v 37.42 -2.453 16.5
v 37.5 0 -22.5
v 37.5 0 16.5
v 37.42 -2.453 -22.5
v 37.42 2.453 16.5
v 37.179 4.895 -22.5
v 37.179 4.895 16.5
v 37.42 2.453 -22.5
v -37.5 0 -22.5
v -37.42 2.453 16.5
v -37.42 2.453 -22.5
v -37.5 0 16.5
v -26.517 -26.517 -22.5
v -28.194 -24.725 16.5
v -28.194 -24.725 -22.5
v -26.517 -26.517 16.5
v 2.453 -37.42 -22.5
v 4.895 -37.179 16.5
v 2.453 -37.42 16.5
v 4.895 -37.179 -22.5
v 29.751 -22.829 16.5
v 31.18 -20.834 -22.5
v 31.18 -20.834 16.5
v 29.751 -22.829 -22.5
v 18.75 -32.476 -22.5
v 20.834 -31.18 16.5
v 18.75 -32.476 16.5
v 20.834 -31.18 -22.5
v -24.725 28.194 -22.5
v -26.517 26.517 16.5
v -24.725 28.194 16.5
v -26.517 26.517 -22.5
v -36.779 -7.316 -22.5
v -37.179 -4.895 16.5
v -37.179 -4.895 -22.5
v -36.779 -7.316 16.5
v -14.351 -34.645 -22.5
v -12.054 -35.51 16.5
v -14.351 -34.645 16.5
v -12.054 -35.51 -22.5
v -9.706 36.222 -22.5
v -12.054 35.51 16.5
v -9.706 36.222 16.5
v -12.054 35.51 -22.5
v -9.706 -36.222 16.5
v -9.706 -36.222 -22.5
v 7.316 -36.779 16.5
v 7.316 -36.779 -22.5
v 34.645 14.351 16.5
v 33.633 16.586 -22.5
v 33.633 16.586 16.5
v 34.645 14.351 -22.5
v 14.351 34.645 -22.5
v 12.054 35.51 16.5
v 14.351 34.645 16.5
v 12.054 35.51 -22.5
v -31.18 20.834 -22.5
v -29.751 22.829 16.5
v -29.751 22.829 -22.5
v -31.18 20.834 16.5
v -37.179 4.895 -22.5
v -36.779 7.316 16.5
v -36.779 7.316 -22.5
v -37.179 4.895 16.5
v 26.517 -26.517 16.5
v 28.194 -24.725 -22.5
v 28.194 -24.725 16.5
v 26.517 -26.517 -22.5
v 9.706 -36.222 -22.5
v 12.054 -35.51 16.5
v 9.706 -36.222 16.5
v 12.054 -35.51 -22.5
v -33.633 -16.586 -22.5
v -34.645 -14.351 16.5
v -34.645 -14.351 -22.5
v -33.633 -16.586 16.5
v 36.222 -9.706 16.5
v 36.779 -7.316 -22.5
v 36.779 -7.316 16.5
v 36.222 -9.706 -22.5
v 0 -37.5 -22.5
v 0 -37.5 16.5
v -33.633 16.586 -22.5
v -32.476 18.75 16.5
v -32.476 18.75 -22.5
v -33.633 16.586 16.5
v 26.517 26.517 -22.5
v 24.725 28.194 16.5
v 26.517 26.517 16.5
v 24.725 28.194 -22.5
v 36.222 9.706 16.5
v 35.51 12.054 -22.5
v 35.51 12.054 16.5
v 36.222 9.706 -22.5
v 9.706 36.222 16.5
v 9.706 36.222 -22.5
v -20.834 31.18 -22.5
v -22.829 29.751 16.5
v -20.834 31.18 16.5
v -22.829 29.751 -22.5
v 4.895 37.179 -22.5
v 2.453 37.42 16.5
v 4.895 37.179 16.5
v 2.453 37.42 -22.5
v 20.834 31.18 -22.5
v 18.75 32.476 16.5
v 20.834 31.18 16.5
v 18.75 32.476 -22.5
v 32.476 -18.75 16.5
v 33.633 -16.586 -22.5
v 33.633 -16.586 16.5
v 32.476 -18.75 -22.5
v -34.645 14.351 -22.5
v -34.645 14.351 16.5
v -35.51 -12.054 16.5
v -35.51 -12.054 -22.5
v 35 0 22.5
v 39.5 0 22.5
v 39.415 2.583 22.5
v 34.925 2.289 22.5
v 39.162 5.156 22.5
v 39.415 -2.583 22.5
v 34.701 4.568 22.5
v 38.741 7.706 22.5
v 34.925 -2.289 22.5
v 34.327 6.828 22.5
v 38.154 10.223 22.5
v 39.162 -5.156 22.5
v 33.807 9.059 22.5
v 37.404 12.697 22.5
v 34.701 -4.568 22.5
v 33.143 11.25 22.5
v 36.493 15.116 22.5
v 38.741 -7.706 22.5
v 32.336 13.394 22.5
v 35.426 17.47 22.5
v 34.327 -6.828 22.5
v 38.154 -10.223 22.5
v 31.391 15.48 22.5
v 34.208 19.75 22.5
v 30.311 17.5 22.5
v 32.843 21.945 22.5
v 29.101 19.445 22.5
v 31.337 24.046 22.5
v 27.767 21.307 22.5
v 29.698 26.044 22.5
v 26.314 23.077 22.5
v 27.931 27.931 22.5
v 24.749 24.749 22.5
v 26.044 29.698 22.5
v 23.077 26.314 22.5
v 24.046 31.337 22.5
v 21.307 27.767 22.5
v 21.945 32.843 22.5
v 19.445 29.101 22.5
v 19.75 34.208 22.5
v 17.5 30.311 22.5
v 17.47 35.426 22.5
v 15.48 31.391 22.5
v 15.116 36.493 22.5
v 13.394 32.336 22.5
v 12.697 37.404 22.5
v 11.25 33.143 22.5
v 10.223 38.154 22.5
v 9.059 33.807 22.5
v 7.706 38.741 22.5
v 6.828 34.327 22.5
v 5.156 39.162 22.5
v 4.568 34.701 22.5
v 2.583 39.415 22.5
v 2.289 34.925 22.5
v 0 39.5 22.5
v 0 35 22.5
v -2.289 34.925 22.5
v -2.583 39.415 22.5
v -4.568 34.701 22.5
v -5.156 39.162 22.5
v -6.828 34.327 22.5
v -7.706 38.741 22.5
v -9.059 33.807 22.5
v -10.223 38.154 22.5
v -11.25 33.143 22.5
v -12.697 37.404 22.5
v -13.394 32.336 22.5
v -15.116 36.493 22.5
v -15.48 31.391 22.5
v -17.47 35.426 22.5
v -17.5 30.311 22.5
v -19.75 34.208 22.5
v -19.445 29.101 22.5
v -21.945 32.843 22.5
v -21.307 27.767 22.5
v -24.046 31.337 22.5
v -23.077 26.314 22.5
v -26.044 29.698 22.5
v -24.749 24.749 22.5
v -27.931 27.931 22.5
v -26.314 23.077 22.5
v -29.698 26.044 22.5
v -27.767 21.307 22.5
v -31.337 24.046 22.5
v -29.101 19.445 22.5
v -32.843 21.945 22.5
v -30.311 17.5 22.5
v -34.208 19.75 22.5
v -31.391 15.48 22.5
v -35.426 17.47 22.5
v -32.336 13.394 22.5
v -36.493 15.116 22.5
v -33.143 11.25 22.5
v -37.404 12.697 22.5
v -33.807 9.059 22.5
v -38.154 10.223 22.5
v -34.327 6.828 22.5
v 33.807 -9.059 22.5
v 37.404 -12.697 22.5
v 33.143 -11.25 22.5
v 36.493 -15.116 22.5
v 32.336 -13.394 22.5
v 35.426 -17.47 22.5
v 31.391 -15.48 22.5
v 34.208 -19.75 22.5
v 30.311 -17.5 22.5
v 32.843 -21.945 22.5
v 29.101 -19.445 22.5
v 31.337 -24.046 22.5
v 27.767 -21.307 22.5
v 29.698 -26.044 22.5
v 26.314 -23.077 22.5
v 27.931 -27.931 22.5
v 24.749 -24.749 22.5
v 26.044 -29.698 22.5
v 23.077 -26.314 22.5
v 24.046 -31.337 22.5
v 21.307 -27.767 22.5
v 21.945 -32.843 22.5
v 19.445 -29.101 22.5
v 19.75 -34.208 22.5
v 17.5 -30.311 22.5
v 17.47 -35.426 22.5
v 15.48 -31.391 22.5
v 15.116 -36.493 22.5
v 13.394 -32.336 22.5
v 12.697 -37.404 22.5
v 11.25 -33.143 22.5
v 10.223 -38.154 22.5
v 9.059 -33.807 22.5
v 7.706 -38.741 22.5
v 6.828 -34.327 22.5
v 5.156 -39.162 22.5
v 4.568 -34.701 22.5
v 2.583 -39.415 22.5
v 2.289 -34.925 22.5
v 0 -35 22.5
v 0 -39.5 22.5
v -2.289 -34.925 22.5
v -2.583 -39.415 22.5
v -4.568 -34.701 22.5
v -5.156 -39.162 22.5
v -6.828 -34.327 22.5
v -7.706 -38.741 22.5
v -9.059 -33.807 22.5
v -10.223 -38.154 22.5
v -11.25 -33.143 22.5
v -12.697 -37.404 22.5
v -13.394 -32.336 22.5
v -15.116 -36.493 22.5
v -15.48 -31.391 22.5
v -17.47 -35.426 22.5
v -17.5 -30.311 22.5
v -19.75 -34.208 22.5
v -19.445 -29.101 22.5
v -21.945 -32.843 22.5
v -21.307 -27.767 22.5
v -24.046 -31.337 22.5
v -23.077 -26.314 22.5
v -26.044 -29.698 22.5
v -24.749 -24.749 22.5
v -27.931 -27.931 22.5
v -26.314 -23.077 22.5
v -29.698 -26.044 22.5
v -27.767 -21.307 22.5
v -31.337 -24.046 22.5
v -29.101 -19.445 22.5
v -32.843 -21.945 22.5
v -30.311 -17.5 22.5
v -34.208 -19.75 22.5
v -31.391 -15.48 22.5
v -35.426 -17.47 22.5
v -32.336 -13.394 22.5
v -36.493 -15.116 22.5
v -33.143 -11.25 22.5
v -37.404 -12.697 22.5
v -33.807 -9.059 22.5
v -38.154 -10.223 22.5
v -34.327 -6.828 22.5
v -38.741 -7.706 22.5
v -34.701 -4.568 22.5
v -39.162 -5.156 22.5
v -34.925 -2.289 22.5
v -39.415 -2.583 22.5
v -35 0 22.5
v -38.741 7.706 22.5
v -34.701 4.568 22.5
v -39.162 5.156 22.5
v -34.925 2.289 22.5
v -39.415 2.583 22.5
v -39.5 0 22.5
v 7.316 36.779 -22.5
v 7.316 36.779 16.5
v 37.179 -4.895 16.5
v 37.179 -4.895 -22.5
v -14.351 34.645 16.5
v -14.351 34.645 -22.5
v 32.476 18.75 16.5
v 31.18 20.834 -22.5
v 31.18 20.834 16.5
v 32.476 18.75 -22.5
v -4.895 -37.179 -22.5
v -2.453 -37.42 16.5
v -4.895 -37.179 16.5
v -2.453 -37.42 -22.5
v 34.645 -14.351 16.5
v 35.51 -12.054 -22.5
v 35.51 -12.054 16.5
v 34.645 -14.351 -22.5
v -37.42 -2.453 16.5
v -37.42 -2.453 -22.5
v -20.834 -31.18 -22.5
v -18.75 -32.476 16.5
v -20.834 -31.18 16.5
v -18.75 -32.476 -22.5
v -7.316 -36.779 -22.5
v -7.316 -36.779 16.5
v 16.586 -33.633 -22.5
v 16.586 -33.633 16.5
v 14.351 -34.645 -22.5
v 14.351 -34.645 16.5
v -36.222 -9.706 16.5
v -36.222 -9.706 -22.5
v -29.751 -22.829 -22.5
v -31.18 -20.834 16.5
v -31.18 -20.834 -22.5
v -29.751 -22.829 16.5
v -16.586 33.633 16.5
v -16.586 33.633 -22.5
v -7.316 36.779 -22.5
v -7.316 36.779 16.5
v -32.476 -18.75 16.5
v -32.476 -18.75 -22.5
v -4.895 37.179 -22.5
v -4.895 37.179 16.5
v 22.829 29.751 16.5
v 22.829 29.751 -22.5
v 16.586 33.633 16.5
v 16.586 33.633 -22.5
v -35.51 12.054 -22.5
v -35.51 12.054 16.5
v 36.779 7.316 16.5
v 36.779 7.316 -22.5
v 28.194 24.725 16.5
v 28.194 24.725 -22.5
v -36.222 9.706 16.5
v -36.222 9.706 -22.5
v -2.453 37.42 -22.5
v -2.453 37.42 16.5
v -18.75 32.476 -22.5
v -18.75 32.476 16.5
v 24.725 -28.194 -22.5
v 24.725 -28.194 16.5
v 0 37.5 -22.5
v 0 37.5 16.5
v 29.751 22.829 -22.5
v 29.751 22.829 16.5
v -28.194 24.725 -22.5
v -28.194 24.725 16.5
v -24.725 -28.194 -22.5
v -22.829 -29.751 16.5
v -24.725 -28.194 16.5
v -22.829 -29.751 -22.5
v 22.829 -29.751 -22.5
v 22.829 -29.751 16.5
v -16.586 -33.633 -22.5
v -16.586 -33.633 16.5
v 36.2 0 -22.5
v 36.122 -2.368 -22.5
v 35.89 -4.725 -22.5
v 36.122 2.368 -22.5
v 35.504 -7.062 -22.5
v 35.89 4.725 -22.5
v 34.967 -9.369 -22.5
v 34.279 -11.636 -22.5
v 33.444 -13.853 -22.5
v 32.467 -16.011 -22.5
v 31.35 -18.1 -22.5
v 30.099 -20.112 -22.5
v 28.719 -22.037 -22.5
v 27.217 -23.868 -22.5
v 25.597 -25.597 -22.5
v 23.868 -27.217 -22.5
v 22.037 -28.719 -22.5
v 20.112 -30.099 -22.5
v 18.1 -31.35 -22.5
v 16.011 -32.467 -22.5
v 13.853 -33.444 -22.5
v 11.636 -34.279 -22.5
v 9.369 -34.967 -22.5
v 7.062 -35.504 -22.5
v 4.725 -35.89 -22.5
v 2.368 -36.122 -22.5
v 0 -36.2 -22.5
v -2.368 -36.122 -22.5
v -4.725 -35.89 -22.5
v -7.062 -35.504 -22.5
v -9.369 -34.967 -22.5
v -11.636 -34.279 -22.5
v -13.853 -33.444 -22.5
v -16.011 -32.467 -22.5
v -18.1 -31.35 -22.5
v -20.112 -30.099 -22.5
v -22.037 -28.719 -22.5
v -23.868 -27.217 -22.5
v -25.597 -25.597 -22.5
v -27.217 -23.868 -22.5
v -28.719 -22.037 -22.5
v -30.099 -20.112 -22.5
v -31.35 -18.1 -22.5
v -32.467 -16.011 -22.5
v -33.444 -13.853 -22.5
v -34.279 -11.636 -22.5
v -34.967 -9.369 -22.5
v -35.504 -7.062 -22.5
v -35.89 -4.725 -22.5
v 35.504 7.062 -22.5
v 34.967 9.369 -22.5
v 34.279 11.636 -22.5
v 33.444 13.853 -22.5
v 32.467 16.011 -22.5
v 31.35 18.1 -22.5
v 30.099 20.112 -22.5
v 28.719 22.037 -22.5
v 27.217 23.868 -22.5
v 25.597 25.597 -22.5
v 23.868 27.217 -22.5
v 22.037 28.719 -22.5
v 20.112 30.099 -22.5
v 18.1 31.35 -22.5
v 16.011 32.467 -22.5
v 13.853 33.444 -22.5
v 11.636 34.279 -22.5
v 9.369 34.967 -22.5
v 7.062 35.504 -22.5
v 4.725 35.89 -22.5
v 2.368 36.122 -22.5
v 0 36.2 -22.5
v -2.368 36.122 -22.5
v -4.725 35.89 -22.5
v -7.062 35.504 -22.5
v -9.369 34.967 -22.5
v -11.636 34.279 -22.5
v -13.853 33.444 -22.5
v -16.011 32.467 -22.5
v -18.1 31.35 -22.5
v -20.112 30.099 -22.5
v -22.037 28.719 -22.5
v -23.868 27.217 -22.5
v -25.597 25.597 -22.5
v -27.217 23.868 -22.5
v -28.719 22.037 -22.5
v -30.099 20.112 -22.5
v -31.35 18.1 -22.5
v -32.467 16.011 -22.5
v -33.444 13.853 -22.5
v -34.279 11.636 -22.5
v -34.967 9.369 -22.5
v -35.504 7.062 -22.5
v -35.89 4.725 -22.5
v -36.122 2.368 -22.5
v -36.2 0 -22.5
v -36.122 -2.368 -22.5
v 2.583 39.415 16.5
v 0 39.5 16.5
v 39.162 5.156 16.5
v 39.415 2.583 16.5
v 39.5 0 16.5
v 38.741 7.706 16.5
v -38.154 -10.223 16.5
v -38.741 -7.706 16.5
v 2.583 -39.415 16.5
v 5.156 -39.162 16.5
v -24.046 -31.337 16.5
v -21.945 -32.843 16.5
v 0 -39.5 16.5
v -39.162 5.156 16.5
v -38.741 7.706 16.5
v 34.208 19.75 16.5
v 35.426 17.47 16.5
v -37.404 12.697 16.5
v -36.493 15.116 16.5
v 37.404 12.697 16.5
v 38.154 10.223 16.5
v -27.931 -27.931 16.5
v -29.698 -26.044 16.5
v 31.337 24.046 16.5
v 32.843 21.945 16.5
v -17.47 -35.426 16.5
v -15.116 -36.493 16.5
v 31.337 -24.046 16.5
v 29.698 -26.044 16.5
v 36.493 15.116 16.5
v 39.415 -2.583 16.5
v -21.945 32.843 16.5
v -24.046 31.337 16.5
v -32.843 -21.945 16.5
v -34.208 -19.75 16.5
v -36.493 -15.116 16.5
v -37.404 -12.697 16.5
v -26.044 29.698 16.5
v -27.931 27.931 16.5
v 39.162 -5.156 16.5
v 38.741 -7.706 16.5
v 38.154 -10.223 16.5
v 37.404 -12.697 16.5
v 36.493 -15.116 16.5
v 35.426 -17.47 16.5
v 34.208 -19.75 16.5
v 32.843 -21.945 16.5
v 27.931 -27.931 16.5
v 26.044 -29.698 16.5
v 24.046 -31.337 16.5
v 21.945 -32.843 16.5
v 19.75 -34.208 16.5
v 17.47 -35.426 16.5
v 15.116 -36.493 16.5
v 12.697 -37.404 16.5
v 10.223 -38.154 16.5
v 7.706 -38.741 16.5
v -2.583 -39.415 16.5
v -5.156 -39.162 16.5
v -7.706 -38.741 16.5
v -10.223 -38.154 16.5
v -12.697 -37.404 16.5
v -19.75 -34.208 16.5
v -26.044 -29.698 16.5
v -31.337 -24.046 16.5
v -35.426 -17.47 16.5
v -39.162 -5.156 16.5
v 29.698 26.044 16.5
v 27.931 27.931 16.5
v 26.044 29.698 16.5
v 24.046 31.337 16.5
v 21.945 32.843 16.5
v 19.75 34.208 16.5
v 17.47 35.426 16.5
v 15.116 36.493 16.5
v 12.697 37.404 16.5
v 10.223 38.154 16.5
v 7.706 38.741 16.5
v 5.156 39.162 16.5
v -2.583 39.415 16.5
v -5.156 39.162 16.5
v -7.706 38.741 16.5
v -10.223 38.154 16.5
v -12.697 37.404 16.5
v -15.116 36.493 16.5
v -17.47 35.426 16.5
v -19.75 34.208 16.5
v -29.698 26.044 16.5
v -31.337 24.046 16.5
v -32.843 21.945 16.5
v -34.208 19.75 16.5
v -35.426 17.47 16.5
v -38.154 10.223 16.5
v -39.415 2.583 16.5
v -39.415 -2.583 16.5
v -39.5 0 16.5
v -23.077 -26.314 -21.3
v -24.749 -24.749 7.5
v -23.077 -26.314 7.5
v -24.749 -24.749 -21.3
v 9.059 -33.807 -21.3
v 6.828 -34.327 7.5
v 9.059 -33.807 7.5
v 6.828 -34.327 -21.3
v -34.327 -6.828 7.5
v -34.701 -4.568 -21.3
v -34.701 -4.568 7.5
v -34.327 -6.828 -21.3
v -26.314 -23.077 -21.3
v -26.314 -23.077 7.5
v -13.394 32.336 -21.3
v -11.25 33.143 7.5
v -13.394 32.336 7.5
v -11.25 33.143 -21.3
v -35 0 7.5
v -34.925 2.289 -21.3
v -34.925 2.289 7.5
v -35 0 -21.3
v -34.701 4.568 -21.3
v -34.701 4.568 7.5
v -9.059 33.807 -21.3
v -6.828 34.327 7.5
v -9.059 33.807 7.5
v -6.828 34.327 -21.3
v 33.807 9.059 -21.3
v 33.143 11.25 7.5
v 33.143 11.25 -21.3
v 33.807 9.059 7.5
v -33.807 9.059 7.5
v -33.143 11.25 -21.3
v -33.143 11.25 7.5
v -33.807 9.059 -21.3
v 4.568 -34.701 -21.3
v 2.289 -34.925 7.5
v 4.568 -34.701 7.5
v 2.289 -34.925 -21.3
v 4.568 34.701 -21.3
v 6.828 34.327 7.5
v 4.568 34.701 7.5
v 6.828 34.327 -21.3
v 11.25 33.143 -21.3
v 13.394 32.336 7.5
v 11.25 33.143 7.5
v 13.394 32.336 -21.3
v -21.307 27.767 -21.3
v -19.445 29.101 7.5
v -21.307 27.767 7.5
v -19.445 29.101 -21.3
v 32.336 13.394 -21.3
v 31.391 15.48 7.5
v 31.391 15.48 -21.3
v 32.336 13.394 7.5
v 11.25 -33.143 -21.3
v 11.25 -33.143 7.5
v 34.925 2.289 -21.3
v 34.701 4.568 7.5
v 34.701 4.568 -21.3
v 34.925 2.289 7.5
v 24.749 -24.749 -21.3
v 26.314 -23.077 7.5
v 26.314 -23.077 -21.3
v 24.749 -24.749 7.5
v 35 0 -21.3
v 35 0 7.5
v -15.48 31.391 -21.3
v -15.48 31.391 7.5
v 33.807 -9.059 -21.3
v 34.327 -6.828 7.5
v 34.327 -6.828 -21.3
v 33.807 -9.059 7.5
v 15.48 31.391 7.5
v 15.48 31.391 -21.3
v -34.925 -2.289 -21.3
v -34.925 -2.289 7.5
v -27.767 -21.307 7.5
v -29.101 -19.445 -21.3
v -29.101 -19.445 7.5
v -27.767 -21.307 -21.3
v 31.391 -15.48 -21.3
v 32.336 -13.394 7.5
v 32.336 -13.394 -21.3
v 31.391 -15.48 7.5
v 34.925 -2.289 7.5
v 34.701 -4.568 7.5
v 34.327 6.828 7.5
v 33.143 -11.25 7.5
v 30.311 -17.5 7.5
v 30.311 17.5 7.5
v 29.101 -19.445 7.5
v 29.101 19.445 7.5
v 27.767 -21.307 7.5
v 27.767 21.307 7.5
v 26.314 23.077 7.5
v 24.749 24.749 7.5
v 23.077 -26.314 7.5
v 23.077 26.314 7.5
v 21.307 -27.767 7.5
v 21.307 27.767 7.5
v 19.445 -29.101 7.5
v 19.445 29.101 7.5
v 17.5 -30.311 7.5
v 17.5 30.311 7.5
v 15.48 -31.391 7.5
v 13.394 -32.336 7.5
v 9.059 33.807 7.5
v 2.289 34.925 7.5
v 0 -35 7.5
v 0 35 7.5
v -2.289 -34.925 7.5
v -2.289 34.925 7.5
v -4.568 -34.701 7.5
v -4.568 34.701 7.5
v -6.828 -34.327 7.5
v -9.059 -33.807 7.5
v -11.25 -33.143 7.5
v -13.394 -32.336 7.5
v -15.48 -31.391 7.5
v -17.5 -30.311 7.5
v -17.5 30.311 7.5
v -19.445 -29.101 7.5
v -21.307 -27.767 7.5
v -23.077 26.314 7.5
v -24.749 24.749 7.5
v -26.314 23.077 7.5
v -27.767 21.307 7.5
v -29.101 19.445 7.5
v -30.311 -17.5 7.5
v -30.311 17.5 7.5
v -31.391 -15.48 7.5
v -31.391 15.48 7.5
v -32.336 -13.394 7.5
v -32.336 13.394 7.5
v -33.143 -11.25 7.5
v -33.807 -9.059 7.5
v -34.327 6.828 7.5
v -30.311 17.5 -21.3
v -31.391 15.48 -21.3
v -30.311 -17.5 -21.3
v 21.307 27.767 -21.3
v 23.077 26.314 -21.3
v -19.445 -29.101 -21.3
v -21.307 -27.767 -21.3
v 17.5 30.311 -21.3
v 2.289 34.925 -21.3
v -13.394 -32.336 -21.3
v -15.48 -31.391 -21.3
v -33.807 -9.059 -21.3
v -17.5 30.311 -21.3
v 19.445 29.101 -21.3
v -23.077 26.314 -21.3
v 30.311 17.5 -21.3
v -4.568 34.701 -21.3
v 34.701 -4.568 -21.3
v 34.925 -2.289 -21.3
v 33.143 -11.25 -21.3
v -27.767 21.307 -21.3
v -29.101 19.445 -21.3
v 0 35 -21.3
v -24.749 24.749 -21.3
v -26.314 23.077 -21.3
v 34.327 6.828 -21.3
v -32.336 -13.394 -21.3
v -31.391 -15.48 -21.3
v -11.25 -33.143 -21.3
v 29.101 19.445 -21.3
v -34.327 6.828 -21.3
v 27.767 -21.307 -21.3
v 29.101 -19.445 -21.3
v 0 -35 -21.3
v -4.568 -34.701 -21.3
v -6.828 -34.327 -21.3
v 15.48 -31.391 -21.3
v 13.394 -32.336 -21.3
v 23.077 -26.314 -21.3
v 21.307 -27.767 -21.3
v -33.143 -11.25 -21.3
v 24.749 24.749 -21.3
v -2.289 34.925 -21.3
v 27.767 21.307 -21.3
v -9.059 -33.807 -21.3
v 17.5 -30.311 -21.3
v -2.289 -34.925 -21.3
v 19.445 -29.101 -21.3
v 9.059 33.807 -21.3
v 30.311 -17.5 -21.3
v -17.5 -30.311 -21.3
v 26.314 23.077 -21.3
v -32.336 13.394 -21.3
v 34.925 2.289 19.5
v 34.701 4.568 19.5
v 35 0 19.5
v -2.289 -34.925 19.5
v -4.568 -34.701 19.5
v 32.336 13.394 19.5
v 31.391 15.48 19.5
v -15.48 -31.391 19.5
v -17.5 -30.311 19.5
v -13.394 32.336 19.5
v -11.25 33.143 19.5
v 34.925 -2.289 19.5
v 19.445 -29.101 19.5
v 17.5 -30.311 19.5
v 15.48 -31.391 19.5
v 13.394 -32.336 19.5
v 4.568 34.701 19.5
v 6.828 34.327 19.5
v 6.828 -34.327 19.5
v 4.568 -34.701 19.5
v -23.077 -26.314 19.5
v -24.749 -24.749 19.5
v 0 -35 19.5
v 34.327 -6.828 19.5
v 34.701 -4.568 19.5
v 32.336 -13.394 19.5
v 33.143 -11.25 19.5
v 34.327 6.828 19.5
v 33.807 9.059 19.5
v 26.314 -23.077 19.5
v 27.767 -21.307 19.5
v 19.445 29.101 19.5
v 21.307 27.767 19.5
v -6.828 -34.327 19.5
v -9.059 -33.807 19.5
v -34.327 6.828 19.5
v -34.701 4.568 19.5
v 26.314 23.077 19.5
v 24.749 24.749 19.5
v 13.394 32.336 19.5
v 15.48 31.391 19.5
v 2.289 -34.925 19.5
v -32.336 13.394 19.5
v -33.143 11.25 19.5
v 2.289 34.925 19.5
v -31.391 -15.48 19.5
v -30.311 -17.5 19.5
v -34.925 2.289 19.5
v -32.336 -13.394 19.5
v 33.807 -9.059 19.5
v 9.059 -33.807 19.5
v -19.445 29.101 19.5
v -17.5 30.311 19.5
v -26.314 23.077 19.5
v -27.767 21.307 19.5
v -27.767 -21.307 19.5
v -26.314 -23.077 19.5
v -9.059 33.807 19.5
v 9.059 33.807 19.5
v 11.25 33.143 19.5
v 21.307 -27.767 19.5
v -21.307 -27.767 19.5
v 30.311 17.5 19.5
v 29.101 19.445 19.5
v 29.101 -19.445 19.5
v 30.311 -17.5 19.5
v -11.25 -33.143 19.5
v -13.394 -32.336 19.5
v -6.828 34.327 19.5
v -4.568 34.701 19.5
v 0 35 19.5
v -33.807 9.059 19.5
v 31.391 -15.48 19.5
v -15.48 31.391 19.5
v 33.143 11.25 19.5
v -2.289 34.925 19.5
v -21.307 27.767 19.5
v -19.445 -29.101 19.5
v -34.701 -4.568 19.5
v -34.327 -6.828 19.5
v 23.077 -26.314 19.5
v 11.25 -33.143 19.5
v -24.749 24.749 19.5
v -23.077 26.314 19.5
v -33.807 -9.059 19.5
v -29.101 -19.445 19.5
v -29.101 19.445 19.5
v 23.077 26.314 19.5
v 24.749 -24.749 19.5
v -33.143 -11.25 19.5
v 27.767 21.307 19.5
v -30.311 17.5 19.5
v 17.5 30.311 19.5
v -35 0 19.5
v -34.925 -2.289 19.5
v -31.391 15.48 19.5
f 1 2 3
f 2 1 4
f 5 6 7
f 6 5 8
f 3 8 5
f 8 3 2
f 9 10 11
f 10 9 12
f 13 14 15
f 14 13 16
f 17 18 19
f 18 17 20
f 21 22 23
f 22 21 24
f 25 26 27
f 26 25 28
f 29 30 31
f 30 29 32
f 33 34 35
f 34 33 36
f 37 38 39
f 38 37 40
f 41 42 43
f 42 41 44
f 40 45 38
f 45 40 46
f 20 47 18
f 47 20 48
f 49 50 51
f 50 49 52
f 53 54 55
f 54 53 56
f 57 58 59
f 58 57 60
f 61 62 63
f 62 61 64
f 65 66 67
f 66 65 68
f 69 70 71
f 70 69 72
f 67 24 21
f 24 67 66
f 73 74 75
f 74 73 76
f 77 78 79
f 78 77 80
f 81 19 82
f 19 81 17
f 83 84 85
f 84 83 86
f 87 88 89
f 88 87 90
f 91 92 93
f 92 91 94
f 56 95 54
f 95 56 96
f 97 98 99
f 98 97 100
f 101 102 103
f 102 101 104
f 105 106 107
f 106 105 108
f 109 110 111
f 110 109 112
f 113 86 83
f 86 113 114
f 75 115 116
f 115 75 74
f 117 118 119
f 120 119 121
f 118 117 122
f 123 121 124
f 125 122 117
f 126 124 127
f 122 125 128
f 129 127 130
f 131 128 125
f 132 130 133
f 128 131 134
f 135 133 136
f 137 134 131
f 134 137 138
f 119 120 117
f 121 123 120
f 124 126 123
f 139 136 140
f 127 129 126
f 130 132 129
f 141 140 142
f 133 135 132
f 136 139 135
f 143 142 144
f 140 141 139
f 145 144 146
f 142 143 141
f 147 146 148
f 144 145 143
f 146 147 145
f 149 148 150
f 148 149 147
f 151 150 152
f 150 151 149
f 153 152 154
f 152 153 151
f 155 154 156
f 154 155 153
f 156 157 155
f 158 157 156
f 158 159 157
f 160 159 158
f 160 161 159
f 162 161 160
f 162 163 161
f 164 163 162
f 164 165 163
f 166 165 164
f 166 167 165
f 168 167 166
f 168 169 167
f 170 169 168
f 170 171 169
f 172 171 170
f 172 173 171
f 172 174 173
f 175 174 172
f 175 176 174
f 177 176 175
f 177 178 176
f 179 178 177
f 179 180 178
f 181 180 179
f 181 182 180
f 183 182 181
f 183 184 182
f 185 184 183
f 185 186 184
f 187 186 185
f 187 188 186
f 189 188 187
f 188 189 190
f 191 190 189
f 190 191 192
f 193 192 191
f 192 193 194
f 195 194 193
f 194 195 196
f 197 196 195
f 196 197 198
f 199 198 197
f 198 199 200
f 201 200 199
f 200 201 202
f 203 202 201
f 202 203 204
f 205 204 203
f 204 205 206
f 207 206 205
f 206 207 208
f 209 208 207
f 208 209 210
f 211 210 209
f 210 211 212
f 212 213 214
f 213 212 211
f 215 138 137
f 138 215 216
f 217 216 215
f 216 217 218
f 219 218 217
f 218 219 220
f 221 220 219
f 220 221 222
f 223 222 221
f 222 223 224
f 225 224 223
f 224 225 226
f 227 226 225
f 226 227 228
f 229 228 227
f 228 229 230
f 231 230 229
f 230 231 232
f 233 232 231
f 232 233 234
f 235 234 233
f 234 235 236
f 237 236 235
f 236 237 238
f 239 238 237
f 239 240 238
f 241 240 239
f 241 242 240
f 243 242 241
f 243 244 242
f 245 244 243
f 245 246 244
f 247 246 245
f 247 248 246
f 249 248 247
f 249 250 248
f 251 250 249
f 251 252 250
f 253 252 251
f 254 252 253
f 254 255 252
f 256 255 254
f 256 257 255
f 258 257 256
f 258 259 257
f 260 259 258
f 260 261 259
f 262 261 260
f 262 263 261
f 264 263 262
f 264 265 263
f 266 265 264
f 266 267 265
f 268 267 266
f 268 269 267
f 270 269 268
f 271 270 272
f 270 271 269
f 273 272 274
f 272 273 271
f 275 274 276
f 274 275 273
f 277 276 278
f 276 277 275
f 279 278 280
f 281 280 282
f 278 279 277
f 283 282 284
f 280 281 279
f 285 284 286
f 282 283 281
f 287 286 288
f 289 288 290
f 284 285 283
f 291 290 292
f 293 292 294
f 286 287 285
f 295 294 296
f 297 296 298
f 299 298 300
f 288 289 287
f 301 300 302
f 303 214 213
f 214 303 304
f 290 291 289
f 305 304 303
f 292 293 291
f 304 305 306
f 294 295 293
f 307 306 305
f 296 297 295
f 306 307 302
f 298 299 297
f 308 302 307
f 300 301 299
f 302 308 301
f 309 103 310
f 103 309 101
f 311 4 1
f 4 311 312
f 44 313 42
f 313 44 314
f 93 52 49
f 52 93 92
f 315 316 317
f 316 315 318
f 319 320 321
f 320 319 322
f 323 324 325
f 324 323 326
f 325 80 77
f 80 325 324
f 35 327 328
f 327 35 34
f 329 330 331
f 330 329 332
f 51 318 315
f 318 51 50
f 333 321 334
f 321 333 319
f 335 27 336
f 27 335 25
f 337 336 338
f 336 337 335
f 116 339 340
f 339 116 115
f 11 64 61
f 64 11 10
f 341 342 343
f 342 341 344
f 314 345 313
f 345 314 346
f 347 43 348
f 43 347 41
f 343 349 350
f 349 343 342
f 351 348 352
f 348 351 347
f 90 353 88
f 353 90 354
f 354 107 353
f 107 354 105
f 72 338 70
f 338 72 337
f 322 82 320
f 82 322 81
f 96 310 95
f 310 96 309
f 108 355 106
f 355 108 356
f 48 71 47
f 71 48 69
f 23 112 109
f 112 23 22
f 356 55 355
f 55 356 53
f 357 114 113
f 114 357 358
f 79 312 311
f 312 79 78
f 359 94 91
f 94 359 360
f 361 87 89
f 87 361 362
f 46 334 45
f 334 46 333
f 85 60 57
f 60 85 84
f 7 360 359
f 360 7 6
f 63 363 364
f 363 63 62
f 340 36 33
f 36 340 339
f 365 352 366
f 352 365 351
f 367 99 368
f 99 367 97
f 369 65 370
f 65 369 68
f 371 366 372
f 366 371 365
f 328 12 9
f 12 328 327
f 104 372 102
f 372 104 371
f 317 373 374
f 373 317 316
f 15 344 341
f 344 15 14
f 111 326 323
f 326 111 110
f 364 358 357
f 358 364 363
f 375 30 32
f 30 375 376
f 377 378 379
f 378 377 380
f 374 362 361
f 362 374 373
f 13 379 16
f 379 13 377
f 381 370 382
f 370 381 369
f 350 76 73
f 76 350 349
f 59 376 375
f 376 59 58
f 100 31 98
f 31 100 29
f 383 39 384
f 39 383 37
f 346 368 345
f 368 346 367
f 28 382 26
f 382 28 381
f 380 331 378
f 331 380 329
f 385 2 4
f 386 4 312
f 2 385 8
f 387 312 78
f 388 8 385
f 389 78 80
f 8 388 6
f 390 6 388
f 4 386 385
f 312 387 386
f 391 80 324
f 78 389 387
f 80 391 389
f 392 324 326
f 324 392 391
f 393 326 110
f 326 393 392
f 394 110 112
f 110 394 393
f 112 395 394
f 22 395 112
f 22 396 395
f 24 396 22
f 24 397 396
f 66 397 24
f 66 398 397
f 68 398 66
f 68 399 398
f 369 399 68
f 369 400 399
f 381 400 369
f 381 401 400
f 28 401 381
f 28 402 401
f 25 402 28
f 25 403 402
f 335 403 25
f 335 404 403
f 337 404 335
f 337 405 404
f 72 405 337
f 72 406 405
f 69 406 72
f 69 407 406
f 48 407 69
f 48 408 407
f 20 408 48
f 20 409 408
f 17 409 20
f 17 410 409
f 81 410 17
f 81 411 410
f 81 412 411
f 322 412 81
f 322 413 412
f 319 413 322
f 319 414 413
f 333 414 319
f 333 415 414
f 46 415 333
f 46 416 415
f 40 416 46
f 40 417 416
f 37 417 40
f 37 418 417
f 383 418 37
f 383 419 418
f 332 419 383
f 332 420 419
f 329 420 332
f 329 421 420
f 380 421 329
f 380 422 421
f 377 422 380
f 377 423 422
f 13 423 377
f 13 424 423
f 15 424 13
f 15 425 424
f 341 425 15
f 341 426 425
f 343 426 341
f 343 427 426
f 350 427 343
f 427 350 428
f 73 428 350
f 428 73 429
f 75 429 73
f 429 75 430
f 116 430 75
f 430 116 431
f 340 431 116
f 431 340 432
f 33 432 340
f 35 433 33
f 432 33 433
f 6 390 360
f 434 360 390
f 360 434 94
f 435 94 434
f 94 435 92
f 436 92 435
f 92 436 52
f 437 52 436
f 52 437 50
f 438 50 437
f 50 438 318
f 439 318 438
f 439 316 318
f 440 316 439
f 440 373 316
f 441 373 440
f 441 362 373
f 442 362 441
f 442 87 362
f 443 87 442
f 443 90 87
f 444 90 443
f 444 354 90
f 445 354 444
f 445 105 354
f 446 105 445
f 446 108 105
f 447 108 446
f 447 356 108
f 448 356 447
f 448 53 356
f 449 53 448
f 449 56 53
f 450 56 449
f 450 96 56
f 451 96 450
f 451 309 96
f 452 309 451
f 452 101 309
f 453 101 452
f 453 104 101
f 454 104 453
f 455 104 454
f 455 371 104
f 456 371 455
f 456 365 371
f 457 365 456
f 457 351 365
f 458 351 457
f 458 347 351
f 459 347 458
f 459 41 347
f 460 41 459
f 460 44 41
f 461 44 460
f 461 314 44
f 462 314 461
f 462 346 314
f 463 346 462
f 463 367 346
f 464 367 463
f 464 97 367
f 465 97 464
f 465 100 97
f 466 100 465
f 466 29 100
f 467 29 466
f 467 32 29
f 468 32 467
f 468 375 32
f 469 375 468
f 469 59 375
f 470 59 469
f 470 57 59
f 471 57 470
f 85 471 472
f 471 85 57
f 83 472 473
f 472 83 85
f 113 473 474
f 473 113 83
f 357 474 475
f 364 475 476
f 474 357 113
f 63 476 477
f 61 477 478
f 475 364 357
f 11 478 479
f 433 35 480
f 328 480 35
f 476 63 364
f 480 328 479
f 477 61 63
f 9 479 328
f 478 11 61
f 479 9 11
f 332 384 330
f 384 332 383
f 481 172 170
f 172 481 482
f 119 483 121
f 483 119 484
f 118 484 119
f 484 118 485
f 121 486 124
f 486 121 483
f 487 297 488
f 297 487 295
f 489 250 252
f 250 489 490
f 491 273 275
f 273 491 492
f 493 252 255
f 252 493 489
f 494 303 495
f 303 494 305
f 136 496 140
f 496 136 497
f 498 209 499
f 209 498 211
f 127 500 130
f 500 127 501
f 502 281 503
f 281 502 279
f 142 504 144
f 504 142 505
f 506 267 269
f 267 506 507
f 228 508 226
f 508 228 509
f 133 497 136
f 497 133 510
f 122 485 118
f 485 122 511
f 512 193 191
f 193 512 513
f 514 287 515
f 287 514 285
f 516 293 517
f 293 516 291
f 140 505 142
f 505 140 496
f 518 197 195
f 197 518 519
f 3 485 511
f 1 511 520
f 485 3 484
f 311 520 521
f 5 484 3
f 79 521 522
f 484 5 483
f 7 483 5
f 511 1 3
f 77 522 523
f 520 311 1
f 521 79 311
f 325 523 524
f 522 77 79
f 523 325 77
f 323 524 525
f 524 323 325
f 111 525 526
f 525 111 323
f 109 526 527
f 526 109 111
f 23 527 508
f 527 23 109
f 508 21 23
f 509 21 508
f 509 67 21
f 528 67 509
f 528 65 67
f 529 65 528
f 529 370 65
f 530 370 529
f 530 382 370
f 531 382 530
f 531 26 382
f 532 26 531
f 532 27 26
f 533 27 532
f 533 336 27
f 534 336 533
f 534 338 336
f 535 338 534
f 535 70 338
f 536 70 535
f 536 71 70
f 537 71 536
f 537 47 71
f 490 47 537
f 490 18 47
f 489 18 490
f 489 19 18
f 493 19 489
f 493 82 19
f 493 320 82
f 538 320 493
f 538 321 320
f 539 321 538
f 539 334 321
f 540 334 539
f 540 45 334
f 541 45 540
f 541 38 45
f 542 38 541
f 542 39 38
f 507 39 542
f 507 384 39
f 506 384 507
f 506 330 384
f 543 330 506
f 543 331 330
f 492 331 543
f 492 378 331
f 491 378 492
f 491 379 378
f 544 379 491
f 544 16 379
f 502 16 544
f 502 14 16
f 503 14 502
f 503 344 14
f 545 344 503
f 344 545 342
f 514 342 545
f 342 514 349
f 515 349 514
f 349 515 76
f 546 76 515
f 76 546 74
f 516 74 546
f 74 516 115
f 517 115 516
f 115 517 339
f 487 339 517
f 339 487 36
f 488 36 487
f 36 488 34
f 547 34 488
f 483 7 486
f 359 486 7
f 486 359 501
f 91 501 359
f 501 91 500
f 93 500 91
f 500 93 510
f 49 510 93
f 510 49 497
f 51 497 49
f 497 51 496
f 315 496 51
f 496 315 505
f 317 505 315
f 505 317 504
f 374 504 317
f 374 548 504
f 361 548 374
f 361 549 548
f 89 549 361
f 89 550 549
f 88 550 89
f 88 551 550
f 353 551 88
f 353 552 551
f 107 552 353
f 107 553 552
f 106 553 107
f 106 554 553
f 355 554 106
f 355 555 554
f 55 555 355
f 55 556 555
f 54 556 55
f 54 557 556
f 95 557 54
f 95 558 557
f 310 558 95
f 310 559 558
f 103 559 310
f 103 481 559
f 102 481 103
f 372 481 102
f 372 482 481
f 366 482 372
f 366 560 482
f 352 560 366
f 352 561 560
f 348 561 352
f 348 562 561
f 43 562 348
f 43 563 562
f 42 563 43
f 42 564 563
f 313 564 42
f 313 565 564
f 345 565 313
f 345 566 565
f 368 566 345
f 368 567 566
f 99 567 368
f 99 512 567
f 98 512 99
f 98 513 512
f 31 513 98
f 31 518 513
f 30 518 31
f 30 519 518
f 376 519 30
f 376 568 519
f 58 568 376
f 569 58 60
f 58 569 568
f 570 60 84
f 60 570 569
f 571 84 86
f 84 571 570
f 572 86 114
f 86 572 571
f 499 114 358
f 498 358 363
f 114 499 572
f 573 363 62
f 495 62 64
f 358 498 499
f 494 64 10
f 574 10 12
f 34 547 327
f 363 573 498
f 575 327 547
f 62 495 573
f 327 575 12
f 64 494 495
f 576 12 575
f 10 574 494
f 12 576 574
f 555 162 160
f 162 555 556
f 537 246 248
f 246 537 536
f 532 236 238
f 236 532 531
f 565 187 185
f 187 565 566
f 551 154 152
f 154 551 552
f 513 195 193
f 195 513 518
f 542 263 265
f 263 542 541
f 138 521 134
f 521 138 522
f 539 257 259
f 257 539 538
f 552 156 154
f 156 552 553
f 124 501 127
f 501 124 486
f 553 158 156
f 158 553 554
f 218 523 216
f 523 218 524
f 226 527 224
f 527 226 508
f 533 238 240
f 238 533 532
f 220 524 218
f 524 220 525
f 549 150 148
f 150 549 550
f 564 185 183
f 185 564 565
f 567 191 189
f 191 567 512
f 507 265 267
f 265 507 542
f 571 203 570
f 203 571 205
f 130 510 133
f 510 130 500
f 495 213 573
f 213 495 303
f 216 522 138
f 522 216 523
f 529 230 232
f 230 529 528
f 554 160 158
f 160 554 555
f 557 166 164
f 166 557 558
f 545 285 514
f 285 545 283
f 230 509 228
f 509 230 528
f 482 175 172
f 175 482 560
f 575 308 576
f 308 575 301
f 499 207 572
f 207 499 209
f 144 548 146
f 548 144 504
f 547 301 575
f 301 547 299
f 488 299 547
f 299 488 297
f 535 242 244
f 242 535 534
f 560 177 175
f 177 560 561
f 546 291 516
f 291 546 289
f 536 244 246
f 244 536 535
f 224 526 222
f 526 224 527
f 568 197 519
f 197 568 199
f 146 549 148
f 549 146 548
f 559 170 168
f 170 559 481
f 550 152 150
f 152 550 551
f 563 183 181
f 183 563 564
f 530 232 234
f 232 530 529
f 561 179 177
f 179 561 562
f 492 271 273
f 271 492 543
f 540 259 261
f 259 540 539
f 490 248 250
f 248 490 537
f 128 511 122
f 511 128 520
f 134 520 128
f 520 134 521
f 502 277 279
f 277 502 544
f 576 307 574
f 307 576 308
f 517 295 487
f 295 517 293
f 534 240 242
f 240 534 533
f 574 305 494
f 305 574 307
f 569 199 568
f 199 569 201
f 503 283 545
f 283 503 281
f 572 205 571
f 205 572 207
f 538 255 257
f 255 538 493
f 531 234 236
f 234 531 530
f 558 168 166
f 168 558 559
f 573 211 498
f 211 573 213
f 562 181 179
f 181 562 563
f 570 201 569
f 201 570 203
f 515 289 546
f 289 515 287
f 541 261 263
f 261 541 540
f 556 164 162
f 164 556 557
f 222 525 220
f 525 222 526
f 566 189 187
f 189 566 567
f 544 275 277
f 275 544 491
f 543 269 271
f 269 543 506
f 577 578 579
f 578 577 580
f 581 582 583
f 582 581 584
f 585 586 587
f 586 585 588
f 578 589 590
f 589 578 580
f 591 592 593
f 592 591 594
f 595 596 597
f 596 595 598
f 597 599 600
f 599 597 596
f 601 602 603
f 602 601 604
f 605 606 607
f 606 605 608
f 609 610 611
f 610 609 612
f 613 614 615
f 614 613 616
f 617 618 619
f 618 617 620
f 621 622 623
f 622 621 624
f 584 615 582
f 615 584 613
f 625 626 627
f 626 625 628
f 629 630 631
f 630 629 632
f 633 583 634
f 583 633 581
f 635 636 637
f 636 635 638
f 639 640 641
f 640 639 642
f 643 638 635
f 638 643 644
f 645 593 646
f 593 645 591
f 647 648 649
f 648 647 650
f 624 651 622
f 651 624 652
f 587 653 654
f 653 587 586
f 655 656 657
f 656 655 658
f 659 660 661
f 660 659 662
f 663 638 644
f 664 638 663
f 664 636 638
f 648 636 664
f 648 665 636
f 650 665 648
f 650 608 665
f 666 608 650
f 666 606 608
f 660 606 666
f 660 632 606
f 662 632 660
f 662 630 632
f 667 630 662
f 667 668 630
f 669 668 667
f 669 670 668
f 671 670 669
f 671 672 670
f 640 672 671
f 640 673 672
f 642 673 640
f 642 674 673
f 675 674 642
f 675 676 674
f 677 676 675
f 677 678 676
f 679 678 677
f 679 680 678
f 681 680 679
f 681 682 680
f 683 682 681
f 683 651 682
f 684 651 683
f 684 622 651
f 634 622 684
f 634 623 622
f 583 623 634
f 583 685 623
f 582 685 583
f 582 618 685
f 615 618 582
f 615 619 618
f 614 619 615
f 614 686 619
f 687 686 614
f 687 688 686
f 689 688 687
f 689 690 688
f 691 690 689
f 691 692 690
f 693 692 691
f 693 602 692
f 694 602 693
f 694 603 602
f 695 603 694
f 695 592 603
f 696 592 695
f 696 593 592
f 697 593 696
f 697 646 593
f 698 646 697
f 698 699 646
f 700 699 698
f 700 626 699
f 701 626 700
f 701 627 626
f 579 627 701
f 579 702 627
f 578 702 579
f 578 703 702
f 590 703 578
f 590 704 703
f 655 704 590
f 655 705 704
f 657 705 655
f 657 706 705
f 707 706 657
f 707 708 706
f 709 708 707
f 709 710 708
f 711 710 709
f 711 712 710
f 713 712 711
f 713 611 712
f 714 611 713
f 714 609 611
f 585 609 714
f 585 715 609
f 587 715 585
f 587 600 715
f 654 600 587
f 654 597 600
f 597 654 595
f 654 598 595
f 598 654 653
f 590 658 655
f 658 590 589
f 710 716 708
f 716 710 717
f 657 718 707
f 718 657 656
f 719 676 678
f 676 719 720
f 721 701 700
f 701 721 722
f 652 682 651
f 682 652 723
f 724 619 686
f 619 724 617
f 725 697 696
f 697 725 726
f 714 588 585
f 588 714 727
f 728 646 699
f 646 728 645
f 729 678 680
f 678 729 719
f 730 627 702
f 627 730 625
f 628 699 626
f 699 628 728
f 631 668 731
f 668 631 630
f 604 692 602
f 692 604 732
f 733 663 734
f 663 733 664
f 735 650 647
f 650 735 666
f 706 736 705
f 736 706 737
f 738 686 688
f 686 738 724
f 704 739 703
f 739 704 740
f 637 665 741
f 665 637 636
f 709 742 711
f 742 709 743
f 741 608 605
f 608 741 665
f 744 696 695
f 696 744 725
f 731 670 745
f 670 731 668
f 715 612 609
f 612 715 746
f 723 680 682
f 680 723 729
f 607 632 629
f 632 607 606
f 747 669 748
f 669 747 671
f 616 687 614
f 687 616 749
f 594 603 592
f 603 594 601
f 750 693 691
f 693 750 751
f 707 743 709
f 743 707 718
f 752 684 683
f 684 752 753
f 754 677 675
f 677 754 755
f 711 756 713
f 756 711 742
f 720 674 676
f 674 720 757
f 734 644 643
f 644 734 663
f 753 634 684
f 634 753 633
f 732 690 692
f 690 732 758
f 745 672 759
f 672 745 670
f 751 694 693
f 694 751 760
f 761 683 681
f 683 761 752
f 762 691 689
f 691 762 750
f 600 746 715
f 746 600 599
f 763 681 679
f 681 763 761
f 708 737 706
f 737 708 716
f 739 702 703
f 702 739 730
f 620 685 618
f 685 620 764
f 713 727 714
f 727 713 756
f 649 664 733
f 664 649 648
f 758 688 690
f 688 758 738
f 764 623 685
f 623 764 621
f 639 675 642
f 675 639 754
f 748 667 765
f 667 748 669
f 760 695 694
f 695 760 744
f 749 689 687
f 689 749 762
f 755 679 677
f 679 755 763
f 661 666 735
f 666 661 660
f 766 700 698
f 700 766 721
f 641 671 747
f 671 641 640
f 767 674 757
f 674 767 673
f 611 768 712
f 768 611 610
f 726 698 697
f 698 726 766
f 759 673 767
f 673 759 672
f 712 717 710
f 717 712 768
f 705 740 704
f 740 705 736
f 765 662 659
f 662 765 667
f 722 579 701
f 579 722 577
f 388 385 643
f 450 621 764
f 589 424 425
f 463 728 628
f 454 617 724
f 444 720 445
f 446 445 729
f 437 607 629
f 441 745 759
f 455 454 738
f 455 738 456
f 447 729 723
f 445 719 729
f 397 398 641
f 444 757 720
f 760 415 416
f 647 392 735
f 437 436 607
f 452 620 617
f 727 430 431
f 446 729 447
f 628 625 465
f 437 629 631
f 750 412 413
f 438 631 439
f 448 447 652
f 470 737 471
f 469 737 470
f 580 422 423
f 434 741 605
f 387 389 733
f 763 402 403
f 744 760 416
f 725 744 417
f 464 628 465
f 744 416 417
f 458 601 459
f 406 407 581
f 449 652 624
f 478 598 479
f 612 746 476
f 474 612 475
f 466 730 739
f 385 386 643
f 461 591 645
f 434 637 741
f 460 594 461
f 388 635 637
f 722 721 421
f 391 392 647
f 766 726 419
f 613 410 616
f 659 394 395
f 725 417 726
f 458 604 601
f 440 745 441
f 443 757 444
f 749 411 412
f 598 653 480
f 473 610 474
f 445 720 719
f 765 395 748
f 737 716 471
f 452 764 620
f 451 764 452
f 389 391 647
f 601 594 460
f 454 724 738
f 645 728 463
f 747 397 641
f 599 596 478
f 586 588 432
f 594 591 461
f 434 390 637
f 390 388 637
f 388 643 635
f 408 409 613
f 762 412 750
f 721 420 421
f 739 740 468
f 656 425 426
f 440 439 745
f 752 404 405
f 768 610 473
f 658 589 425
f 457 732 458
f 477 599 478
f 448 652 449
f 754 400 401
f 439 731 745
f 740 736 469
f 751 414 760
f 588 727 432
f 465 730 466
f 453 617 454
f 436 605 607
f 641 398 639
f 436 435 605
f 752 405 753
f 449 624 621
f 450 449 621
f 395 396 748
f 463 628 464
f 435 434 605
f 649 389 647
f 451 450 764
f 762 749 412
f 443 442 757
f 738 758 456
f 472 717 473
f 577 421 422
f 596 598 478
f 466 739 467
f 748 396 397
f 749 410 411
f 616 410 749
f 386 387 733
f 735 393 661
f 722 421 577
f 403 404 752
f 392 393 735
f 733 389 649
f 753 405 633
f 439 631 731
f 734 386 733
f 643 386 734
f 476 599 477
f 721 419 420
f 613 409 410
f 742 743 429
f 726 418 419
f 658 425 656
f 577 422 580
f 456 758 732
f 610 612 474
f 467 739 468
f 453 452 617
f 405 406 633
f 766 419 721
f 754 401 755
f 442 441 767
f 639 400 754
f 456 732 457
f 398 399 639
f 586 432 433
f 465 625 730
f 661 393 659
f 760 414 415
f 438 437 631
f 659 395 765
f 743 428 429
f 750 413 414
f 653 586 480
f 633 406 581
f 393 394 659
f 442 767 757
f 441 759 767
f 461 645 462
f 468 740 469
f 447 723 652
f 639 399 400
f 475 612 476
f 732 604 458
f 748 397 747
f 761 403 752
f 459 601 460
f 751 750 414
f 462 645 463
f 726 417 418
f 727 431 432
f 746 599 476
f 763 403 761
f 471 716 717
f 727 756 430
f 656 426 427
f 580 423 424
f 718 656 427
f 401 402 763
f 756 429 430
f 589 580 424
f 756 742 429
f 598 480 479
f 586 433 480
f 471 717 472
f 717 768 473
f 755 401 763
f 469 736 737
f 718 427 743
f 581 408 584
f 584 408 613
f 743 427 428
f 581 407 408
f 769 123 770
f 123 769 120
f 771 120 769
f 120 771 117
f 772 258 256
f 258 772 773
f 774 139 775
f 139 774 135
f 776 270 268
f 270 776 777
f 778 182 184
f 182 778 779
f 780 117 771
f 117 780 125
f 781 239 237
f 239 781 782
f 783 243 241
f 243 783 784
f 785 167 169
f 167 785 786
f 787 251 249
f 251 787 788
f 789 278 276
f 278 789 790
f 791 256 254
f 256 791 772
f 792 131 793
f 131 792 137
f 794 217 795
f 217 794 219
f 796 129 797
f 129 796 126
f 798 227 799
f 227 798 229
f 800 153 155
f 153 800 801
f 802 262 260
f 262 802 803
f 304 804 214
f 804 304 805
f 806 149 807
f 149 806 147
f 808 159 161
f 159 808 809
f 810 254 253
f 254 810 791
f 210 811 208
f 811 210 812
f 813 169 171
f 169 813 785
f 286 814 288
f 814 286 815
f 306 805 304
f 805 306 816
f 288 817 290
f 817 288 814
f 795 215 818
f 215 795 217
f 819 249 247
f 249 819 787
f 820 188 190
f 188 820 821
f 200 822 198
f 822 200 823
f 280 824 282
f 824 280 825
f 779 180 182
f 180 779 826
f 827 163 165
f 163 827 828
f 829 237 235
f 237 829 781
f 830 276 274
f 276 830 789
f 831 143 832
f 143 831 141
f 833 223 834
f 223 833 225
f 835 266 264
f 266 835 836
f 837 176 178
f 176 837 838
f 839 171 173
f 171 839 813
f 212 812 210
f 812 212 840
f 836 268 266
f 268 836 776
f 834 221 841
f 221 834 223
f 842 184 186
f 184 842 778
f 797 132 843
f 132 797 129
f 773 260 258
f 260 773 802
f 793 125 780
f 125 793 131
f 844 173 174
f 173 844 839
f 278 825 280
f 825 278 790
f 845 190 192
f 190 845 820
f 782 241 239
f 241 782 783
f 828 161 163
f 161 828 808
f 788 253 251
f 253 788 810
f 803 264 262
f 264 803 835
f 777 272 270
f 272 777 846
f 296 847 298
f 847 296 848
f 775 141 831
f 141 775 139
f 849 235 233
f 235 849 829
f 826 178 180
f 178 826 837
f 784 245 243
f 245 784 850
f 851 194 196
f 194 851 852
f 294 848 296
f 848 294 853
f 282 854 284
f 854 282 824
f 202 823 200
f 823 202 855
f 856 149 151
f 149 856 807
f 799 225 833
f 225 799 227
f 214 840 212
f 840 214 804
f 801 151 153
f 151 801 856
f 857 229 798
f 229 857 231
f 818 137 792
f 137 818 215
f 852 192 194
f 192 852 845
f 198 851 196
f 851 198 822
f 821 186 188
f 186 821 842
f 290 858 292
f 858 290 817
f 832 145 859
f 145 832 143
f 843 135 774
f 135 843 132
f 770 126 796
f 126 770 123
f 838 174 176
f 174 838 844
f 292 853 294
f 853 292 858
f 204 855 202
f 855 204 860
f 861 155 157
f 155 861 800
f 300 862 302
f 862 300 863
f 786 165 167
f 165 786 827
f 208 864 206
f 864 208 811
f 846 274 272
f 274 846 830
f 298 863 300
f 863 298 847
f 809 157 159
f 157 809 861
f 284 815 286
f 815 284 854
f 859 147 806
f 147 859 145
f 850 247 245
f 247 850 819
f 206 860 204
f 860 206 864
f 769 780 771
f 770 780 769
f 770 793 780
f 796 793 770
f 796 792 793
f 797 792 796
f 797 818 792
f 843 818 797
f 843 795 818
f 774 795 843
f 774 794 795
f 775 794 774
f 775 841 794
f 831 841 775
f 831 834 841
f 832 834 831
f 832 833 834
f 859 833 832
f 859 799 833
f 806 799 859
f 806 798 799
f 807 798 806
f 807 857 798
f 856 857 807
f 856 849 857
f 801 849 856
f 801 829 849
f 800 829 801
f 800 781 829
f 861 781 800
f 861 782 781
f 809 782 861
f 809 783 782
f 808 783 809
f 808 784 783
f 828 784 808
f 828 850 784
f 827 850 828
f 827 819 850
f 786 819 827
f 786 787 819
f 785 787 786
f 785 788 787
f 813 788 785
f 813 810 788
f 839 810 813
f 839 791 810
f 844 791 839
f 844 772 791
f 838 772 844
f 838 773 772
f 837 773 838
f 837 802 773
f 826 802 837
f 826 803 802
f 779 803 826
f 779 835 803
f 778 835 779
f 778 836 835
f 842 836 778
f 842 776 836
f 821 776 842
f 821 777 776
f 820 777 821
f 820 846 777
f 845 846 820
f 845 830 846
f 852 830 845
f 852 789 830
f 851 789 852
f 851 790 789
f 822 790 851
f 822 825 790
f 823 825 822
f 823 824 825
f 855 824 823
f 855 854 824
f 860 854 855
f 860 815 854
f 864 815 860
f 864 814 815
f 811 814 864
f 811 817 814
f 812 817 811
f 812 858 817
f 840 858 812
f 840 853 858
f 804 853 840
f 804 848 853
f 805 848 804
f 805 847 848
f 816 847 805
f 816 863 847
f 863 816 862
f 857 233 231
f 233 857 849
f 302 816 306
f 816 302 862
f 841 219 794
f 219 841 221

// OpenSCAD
$fn=96;

module ht75_cap(
    od=75,
    wall=2.5,
    height=45,
    top_thickness=3,
    socket_depth=30,
    lip_height=6,
    lip_extra=2.0,
    chamfer=1.2
){
    id = od - 2*wall;
    outer_r = od/2;
    inner_r = id/2;

    module outer_shell(){
        union(){
            cylinder(h=height, r=outer_r);
            translate([0,0,height-lip_height])
                cylinder(h=lip_height, r=outer_r + lip_extra);
        }
    }

    module inner_void(){
        union(){
            translate([0,0,0])
                cylinder(h=socket_depth, r=inner_r);
            translate([0,0,0])
                cylinder(h=chamfer, r1=inner_r+chamfer, r2=inner_r);
        }
    }

    module top_relief(){
        translate([0,0,height-top_thickness])
            cylinder(h=top_thickness+0.2, r=inner_r);
    }

    translate([0,0,-height/2])
    difference(){
        outer_shell();
        inner_void();
        top_relief();
    }
}

ht75_cap();
